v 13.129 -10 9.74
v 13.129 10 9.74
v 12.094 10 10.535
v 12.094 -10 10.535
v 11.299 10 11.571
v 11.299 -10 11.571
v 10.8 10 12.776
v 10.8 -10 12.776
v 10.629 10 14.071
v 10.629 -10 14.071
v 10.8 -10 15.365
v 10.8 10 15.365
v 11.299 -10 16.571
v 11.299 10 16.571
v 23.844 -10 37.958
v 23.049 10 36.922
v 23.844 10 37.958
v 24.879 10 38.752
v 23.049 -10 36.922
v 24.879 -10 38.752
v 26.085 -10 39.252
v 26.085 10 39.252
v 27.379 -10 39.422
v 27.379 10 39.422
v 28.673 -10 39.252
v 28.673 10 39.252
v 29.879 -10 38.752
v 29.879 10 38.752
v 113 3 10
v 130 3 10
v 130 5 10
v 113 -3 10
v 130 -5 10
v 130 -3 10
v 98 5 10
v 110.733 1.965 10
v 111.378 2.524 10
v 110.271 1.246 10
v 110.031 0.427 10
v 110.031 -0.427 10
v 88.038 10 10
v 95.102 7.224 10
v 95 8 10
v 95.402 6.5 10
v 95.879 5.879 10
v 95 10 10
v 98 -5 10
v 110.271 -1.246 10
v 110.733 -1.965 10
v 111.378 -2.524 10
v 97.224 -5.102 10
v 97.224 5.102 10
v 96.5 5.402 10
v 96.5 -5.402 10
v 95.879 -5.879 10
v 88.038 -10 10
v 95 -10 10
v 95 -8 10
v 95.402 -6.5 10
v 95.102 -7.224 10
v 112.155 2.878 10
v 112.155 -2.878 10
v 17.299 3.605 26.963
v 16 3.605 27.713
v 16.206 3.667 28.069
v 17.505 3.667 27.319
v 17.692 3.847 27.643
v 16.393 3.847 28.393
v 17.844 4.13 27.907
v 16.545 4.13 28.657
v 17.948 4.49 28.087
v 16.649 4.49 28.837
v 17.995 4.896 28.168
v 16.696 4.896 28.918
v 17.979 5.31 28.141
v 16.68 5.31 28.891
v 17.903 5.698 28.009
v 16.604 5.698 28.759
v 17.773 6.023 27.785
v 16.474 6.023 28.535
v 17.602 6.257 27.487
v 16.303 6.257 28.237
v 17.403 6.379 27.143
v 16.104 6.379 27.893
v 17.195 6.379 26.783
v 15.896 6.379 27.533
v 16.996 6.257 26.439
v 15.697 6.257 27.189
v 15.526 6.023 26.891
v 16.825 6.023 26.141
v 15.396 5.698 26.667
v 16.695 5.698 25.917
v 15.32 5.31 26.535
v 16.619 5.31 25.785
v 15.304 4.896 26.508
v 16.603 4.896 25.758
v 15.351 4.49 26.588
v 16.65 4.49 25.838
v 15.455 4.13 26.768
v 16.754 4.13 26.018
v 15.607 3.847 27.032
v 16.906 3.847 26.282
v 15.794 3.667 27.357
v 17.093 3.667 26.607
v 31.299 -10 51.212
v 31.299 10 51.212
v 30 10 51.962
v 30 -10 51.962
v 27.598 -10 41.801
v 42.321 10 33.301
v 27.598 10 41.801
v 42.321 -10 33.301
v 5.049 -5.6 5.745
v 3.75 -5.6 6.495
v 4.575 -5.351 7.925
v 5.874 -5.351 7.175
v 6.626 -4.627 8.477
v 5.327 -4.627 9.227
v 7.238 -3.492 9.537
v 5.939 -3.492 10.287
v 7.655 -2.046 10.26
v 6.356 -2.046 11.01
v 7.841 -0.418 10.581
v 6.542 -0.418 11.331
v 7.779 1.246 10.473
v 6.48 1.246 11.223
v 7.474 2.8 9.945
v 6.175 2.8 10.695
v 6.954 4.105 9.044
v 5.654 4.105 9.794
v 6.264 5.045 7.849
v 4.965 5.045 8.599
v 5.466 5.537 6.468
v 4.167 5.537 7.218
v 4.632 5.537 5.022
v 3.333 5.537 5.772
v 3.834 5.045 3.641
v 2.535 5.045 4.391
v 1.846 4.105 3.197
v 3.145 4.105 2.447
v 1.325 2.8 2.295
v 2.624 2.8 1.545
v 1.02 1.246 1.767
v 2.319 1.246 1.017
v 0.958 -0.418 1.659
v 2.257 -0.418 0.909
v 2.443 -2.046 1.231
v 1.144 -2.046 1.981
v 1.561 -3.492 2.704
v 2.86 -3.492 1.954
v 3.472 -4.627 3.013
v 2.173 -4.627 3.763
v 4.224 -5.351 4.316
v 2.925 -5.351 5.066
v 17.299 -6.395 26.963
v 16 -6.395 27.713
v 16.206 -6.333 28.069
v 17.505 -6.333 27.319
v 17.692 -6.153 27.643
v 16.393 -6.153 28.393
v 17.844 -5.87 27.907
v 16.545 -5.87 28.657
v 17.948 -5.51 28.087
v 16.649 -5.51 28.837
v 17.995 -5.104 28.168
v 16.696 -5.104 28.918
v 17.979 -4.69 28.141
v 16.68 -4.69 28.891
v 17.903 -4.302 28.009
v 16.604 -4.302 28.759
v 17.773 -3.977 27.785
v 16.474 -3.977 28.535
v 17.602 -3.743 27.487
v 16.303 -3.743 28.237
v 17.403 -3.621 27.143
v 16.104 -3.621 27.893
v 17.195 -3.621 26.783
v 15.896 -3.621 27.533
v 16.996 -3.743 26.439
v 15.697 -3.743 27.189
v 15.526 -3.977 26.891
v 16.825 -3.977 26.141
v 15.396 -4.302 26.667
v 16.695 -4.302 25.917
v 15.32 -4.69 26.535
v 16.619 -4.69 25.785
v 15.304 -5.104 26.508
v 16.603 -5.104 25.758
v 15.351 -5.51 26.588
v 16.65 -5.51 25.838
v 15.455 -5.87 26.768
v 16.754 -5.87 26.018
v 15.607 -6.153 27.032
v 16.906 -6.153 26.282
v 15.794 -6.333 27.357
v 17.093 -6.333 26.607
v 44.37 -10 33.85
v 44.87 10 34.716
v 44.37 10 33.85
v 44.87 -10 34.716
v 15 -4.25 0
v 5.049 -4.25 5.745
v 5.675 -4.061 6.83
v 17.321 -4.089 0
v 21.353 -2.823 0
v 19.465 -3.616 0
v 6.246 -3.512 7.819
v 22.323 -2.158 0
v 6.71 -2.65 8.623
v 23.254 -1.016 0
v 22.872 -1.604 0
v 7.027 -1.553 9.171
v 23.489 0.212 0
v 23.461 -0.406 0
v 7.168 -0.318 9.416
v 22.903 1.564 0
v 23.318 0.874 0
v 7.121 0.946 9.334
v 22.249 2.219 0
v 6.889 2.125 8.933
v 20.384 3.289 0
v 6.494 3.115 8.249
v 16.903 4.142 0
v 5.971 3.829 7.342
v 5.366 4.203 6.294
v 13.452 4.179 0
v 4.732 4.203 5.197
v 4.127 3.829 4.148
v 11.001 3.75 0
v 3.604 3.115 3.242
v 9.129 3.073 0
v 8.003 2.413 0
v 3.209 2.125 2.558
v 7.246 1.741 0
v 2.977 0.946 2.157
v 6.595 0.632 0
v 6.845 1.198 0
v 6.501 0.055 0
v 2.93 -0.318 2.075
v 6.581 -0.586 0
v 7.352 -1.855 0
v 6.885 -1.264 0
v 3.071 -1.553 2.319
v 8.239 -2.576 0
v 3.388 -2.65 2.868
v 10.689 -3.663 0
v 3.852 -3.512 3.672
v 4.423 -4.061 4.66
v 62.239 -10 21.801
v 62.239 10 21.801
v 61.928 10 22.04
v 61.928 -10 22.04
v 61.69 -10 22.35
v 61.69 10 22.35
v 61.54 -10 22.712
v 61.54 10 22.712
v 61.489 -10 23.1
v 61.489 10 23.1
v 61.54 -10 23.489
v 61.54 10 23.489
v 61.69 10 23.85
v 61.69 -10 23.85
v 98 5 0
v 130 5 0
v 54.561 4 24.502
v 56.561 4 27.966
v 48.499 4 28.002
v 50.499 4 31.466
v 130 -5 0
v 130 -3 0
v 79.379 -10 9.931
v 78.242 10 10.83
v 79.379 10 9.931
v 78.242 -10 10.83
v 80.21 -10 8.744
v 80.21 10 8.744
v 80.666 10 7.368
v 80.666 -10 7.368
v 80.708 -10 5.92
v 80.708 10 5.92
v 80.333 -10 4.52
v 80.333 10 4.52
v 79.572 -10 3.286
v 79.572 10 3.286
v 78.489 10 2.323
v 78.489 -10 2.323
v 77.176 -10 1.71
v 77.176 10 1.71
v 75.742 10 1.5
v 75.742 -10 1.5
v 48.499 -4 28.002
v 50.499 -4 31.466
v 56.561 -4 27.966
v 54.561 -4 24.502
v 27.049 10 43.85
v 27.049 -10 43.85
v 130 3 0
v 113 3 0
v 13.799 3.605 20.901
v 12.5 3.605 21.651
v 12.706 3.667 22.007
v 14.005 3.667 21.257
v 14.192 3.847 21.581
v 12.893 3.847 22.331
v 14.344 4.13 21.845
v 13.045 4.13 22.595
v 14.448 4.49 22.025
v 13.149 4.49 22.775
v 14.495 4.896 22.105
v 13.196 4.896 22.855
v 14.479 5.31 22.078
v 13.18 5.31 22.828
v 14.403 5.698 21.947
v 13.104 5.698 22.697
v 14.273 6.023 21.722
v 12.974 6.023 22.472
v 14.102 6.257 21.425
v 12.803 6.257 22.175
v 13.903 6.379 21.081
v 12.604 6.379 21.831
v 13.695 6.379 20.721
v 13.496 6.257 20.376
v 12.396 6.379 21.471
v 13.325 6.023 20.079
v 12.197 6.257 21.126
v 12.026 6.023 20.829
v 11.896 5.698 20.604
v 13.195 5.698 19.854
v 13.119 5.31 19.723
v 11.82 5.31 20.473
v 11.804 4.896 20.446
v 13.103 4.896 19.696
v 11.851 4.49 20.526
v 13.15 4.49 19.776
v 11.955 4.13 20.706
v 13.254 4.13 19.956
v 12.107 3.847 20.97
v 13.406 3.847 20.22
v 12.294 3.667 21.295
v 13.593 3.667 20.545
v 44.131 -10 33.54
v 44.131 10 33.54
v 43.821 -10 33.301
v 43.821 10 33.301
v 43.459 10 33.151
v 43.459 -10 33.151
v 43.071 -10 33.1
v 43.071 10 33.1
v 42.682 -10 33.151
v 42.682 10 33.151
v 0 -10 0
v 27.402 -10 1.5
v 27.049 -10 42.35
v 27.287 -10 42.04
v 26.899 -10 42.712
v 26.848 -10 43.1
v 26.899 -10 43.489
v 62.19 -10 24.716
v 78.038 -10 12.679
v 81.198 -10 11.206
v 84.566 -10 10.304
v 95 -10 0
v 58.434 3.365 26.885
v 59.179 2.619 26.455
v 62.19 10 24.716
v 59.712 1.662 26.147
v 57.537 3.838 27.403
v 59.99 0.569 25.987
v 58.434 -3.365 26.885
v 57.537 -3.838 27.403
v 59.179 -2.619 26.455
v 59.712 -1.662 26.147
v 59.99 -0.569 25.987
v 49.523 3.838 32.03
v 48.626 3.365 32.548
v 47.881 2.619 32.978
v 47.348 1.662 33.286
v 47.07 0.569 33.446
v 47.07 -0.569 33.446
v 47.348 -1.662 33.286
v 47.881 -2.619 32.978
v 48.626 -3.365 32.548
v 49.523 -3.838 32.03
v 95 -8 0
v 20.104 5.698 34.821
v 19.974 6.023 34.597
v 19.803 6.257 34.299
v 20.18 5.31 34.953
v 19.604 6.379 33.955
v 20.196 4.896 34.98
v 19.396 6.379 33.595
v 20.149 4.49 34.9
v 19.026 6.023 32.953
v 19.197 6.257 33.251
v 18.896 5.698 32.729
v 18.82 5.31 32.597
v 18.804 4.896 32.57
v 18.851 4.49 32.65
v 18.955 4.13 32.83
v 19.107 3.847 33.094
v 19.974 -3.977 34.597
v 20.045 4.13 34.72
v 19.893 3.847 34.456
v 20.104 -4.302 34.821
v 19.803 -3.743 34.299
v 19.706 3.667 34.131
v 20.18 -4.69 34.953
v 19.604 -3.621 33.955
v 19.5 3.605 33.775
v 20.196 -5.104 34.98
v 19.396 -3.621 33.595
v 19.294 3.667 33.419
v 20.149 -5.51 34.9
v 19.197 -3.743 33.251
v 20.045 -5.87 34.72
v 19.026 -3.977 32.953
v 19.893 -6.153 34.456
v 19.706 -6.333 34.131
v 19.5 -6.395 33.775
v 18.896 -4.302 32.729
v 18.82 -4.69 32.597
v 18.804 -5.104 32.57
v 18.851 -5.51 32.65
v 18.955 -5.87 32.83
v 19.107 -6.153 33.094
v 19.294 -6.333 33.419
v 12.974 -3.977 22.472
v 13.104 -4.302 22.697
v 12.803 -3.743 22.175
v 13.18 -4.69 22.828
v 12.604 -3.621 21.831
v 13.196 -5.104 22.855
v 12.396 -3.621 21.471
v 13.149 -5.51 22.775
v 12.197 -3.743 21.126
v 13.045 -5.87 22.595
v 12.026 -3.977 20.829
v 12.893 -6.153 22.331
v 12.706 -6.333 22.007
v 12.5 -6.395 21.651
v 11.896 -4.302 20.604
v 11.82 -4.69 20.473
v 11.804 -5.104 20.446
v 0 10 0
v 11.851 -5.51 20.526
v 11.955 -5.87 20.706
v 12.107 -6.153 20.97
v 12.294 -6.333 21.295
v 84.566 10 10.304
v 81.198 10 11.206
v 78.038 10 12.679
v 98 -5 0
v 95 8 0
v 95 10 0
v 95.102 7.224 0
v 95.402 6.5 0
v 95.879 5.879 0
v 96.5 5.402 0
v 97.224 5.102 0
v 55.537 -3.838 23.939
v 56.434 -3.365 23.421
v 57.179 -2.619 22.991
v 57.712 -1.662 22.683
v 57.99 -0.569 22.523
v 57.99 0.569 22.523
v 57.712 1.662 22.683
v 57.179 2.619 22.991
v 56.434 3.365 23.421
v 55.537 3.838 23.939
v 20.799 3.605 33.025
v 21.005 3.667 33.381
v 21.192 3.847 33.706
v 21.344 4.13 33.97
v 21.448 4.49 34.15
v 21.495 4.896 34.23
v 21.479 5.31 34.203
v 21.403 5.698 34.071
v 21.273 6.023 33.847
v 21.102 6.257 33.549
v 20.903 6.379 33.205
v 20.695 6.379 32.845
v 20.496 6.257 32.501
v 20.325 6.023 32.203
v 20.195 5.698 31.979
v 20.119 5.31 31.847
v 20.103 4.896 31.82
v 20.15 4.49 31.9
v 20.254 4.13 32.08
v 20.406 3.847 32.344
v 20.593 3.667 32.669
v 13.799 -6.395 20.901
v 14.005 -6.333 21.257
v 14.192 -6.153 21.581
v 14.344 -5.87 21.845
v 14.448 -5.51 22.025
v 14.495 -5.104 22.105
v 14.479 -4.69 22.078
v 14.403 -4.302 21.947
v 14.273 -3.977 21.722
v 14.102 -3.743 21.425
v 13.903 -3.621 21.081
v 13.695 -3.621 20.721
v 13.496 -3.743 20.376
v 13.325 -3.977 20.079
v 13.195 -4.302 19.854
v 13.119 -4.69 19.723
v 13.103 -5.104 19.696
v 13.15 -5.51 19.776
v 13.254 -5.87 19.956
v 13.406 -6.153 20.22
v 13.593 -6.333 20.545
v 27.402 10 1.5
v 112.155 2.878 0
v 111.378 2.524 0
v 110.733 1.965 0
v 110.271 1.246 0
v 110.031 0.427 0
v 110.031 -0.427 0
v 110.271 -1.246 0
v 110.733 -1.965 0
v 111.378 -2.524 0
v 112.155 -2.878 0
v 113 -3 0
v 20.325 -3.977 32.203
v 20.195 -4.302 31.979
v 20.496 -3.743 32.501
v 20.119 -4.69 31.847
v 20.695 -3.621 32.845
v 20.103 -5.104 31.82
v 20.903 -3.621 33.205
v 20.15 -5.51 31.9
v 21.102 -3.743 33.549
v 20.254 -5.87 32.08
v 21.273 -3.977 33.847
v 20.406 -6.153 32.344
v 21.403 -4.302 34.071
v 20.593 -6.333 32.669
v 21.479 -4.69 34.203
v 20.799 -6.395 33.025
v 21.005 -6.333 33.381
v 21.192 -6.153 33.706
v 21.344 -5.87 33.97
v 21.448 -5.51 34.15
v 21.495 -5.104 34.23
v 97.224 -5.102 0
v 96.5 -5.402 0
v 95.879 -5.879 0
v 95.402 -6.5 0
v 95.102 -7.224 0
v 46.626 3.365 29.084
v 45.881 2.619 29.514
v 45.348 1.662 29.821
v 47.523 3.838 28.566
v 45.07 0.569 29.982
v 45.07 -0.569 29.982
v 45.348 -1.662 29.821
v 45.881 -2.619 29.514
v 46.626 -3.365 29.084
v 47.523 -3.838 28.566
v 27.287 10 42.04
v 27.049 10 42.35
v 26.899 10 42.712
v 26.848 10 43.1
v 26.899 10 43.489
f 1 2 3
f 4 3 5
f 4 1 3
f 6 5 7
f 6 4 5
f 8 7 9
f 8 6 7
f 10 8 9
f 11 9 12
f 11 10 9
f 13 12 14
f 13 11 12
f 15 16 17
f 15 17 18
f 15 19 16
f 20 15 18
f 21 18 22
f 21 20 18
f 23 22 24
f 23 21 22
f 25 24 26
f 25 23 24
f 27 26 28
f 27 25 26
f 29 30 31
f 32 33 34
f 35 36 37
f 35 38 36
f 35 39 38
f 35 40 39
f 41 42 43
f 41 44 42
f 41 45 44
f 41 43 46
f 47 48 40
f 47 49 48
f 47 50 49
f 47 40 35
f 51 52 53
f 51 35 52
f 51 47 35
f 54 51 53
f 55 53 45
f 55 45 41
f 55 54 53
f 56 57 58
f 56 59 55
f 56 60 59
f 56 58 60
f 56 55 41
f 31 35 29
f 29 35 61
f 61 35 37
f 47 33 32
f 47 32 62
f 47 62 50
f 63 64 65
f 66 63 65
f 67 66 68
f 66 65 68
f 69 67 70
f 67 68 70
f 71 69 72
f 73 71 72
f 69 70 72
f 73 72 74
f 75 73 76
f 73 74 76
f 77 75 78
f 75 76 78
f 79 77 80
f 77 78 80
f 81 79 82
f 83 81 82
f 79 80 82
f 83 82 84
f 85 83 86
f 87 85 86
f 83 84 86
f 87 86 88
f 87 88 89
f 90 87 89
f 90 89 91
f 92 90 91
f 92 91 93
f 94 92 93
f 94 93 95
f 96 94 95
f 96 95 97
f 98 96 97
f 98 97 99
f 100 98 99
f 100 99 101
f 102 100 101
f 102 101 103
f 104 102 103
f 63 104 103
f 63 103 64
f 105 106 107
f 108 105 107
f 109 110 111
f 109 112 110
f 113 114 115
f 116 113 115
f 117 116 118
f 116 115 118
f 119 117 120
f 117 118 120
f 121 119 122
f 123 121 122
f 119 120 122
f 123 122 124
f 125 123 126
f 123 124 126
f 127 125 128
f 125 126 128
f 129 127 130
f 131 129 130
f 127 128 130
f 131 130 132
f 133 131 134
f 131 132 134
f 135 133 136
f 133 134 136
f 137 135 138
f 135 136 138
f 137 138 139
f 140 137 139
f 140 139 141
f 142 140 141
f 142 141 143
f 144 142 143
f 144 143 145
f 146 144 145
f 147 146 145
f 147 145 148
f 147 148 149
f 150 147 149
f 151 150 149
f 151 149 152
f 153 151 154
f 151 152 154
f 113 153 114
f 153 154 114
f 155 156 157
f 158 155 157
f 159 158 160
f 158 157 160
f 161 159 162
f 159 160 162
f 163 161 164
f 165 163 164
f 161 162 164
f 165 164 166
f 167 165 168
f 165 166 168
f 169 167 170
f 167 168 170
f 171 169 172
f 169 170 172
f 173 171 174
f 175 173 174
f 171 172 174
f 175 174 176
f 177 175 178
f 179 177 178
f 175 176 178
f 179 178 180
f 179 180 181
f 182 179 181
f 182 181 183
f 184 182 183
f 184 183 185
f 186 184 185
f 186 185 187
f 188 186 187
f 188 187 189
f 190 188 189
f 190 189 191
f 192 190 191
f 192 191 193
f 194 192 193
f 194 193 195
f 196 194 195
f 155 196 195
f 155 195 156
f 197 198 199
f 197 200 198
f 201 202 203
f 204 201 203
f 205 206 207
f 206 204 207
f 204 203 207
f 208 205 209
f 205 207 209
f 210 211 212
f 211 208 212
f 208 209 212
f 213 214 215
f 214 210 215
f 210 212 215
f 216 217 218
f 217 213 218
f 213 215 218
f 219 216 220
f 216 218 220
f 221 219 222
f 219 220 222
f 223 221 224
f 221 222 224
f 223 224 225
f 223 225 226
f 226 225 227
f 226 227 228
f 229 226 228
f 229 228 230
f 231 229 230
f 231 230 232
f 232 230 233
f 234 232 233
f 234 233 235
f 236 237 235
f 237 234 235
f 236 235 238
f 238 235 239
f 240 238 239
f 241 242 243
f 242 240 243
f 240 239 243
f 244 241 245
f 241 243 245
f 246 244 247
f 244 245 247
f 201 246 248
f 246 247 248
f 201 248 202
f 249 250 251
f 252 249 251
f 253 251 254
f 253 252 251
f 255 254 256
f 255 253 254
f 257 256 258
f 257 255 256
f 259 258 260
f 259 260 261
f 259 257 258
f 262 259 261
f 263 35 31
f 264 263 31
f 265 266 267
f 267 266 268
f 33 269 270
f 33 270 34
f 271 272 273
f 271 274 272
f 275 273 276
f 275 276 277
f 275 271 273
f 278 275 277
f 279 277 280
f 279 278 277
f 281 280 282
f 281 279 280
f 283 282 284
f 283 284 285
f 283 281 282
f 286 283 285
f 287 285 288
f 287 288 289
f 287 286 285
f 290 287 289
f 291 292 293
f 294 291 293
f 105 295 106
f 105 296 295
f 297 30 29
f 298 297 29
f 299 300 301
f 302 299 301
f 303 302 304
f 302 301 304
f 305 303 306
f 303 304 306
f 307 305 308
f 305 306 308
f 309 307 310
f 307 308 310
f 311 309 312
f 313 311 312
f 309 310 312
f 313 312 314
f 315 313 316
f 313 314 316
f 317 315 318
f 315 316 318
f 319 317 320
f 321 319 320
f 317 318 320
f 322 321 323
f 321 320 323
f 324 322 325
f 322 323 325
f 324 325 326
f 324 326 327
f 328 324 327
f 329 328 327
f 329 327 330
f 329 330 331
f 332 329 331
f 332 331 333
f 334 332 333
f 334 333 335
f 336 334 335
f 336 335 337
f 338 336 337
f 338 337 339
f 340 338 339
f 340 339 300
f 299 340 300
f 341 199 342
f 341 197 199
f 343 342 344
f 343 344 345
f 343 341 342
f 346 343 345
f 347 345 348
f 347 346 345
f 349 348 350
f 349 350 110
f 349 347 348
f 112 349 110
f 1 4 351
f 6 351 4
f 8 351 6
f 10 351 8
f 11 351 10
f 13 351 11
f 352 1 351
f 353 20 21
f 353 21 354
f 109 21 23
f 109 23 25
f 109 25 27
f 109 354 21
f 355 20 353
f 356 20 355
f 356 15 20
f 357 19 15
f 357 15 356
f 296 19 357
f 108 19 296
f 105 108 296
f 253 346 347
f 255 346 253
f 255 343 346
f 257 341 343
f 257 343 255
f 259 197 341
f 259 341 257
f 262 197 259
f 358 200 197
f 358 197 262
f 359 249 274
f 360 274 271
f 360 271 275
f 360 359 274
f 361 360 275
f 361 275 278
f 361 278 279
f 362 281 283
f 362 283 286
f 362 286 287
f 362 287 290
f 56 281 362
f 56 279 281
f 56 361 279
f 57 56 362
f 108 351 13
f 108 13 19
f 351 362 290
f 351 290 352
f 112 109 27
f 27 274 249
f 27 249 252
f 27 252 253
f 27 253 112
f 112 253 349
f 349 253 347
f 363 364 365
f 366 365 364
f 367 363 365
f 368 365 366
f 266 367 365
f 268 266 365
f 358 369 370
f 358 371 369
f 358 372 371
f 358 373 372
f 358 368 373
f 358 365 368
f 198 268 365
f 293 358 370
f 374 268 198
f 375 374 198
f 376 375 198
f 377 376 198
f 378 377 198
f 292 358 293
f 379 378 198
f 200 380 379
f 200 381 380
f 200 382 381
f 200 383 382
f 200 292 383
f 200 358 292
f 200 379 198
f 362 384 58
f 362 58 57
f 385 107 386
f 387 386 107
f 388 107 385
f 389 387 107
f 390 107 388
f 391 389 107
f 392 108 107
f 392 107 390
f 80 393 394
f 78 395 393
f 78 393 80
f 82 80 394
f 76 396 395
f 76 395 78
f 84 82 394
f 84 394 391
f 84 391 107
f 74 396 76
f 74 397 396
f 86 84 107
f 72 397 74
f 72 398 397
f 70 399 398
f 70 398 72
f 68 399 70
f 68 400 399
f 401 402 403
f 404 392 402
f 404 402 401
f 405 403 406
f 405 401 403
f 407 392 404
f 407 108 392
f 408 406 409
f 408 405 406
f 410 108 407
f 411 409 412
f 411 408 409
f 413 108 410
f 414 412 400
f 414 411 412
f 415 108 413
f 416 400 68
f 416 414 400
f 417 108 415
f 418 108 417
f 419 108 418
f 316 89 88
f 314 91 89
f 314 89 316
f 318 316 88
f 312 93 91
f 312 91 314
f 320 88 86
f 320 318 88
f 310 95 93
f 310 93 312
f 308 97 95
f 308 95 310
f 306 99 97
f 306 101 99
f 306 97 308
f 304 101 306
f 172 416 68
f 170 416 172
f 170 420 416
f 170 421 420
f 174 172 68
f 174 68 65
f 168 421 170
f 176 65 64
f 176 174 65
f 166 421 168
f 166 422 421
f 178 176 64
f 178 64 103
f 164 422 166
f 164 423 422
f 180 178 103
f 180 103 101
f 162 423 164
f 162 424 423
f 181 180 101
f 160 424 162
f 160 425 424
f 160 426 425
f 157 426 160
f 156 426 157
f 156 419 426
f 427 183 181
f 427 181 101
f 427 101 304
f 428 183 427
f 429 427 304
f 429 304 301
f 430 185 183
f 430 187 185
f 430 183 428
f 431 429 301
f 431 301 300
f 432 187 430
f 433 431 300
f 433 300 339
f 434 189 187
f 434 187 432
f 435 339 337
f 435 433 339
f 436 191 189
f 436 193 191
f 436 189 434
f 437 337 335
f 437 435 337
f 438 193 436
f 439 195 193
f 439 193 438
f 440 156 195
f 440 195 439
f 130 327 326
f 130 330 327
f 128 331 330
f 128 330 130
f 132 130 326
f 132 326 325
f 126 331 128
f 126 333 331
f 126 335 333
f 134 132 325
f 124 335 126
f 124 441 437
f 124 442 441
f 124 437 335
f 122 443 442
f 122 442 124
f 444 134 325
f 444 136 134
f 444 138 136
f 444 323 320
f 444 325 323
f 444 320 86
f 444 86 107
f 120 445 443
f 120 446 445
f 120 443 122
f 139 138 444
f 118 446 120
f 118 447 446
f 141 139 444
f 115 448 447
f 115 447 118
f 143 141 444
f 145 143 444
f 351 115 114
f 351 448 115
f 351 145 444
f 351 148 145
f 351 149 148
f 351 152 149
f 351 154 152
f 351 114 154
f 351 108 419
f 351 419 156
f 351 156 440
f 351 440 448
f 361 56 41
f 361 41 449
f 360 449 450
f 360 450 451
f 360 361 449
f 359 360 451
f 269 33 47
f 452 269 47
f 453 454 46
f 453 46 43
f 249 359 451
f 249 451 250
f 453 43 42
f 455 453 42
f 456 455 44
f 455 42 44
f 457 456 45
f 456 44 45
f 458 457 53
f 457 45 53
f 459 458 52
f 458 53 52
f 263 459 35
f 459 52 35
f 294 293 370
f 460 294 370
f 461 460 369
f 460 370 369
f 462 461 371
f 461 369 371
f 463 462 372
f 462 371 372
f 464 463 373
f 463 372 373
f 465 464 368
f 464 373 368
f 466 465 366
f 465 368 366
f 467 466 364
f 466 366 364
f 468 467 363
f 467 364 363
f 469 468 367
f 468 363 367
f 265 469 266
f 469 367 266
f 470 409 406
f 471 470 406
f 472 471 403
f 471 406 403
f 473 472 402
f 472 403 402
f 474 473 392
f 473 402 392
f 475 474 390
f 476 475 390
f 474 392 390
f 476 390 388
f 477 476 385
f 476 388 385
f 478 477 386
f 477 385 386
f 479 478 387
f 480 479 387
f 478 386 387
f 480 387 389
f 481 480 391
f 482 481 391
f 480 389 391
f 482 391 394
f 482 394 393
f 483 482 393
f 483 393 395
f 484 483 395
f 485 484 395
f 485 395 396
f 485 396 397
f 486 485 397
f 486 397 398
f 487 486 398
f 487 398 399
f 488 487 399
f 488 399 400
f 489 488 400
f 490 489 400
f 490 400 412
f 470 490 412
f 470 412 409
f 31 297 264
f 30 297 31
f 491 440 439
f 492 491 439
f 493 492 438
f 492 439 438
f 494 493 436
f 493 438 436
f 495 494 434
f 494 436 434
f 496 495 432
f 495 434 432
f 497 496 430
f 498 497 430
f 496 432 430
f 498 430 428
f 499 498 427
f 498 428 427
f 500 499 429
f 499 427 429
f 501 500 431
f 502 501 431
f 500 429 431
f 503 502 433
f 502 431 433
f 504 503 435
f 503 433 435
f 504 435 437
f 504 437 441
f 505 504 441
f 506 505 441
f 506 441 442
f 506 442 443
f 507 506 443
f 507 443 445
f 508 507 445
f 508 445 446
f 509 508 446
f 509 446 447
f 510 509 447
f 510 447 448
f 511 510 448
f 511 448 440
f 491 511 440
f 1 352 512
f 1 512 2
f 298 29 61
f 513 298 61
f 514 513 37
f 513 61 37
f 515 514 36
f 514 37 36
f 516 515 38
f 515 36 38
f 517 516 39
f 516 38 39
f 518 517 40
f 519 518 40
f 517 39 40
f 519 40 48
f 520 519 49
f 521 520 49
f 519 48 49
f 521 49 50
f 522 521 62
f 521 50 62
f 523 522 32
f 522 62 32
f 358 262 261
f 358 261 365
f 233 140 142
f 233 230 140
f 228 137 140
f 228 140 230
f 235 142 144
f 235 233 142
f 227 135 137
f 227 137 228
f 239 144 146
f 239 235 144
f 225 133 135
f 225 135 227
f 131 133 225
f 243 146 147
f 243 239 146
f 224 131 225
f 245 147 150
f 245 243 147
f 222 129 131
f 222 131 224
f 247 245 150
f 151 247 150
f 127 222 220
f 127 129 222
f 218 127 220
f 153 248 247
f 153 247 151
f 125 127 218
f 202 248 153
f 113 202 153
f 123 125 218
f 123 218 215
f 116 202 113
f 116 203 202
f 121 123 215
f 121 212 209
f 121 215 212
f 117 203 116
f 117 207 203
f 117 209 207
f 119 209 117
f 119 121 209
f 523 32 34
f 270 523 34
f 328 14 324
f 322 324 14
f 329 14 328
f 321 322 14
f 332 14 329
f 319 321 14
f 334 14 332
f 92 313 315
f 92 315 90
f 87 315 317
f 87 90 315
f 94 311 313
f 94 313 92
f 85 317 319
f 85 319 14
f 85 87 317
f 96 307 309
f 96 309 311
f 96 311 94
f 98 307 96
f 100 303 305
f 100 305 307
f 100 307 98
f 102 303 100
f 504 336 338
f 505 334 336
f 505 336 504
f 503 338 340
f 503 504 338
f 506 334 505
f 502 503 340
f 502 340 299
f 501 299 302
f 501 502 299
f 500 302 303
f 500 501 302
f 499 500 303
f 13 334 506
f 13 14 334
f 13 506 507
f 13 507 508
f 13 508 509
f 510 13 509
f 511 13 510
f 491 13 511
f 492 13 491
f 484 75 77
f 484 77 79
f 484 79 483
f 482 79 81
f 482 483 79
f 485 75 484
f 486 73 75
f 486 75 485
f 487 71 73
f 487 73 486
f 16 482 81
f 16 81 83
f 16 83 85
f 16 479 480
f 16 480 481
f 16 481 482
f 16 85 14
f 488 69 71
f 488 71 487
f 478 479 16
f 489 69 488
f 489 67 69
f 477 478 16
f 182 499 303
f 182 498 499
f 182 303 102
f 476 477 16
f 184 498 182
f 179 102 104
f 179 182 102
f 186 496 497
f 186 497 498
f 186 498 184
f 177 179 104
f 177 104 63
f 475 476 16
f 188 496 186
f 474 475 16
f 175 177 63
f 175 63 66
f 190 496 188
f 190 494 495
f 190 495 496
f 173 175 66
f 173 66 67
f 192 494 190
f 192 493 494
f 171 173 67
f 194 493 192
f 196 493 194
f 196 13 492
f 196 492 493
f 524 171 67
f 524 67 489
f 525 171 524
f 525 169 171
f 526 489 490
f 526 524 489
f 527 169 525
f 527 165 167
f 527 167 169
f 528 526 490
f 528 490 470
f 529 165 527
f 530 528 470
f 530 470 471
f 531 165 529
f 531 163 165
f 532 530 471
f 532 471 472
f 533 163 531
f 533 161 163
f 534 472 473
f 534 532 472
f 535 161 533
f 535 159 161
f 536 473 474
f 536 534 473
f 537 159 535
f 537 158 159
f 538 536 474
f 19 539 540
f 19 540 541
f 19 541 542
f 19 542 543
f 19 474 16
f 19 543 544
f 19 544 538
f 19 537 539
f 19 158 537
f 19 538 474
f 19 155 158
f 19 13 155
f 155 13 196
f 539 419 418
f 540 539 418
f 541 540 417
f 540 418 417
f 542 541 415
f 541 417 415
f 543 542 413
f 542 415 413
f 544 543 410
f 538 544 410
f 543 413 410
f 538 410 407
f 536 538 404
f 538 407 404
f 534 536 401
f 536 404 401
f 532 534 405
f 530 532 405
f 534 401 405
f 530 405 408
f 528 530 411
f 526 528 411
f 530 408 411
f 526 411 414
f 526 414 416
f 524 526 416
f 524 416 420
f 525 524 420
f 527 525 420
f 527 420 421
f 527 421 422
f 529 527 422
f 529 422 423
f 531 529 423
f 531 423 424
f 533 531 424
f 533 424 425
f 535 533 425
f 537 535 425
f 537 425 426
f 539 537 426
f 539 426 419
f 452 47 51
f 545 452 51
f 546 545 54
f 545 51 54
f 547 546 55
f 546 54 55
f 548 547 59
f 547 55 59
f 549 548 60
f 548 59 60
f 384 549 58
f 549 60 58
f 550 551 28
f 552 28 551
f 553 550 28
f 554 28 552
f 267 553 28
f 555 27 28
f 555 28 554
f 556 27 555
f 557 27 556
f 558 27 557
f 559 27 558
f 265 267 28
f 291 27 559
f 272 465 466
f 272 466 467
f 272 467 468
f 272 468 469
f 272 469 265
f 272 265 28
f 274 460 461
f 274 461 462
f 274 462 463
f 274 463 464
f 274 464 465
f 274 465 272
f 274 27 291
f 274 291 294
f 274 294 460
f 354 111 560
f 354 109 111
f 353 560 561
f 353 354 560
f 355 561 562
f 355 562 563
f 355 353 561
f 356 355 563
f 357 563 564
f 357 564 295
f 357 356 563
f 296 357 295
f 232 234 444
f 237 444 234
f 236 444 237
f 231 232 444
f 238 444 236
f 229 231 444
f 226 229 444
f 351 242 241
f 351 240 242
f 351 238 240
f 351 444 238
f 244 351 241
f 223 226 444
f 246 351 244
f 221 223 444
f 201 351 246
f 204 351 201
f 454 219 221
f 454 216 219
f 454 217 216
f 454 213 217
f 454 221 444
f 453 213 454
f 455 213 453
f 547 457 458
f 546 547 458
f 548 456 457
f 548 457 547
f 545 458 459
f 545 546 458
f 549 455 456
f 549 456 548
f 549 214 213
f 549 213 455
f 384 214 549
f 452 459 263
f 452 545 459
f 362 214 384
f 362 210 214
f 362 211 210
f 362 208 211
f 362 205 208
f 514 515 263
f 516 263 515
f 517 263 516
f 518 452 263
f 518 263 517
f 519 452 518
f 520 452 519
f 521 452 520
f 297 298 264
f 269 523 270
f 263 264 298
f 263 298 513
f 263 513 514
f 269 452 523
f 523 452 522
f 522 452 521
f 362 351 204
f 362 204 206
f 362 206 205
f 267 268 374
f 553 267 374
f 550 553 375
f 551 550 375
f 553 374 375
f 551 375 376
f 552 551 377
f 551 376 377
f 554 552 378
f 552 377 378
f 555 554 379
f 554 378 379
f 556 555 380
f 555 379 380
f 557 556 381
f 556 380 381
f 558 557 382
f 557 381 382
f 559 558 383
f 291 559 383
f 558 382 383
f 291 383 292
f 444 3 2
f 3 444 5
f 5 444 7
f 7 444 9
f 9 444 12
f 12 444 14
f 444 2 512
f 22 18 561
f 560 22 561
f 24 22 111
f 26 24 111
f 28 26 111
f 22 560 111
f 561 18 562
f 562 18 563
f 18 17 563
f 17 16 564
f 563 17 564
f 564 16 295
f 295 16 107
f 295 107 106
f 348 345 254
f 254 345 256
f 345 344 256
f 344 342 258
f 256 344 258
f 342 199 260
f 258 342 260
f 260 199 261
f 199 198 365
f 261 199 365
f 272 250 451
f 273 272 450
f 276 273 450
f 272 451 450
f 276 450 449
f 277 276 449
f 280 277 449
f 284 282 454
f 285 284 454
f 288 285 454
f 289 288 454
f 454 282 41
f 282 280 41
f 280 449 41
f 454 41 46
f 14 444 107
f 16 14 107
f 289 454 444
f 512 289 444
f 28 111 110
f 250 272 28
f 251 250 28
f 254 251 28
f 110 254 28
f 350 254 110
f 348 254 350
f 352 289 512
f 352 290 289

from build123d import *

# Parameters (mm, degrees)
F1_DEPTH  = 10
F3_DEPTH  = 10.001
F5_DEPTH  = 25
F6_R      = 1.395
F7_DEPTH  = 25
F8_R      = 4.25
F9_DEPTH  = 112.584302492
F8_R_2    = 5.6
F10_DEPTH = 1.5


with BuildPart() as f1:
    # F0 (on Front) → F1 (new body, symmetric)
    with BuildSketch(Plane.XZ):
        with BuildLine():
            Line((30, 51.9615242271), (0, 0))
            Line((0, 0), (130, 0))
            Line((130, 0), (130, 10))
            Line((130, 10), (88.0384757729, 10))
            ThreePointArc((88.0384757729, 10), (82.8620948709, 10.6814834742), (78.0384757729, 12.6794919243))
            Line((78.0384757729, 12.6794919243), (62.2390923627, 21.8012701892))
            ThreePointArc((62.2390923627, 21.8012701892), (61.5402036233, 22.7120797272), (61.6900542571, 23.8503082949))
            Line((61.6900542571, 23.8503082949), (62.1900542571, 24.7163336987))
            Line((62.1900542571, 24.7163336987), (44.8695461814, 34.7163336987))
            Line((44.8695461814, 34.7163336987), (44.3695461814, 33.8503082949))
            ThreePointArc((44.3695461814, 33.8503082949), (43.4587366433, 33.1514195555), (42.3205080757, 33.3012701892))
            Line((42.3205080757, 33.3012701892), (27.5980762114, 41.8012701892))
            ThreePointArc((27.5980762114, 41.8012701892), (26.8991874719, 42.7120797272), (27.0490381057, 43.8503082949))
            Line((27.0490381057, 43.8503082949), (31.2990381057, 51.2115242271))
            Line((31.2990381057, 51.2115242271), (30, 51.9615242271))
        make_face()
        with BuildLine():
            Line((27.4019237886, 1.5), (13.1291651246, 9.7403810568))
            ThreePointArc((13.1291651246, 9.7403810568), (10.7995359932, 12.7764128502), (11.2990381057, 16.5705080757))
            Line((11.2990381057, 16.5705080757), (23.0490381057, 36.9221050646))
            ThreePointArc((23.0490381057, 36.9221050646), (26.0850698991, 39.2517341961), (29.8791651246, 38.7522320835))
            Line((29.8791651246, 38.7522320835), (78.2416697508, 10.8301270189))
            ThreePointArc((78.2416697508, 10.8301270189), (80.5712988822, 5.2059047745), (75.7416697508, 1.5))
            Line((75.7416697508, 1.5), (27.4019237886, 1.5))
        make_face(mode=Mode.SUBTRACT)
    extrude(amount=F1_DEPTH, both=True)

    # F2 (on face) → F3 (cut, through all)
    with BuildSketch(Plane.XY.offset(10)):
        with BuildLine():
            Line((130, 3), (113, 3))
            ThreePointArc((113, 3), (110, 0), (113, -3))
            Line((113, -3), (130, -3))
            Line((130, -3), (130, 3))
        make_face()
        with BuildLine():
            Line((98, 5), (130, 5))
            Line((130, 5), (130, 10))
            Line((130, 10), (95, 10))
            Line((95, 10), (95, 8))
            ThreePointArc((95, 8), (95.8786796564, 5.8786796564), (98, 5))
        make_face()
        with BuildLine():
            Line((95, -10), (130, -10))
            Line((130, -10), (130, -5))
            Line((130, -5), (98, -5))
            ThreePointArc((98, -5), (95.8786796564, -5.8786796564), (95, -8))
            Line((95, -8), (95, -10))
        make_face()
    extrude(amount=-F3_DEPTH, mode=Mode.SUBTRACT)

    # F4 (on face) → F5 (cut)
    with BuildSketch(Plane(origin=(30, 0, 51.9615242271), x_dir=(0.8660254038, 0, -0.5), z_dir=(0.5, 0, 0.8660254038))):
        with BuildLine():
            ThreePointArc((28, 4), (24, 0), (28, -4))
            Line((28, -4), (35, -4))
            ThreePointArc((35, -4), (39, 0), (35, 4))
            Line((35, 4), (28, 4))
        make_face()
    extrude(amount=-F5_DEPTH, mode=Mode.SUBTRACT)

    # F6 (on face) → F7 (cut)
    with BuildSketch(Plane(origin=(0, 0, 0), x_dir=(0, -1, 0), z_dir=(-0.8660254038, 0, 0.5))):
        with Locations((-5, 25)):
            Circle(F6_R)
        with Locations((-5, 32)):
            Circle(F6_R)
        with Locations((-5, 39)):
            Circle(F6_R)
        with Locations((5, 25)):
            Circle(F6_R)
        with Locations((5, 32)):
            Circle(F6_R)
        with Locations((5, 39)):
            Circle(F6_R)
    extrude(amount=-F7_DEPTH, mode=Mode.SUBTRACT)

    # F8 (on face) → F9 (cut, through all)
    with BuildSketch(Plane(origin=(0, 0, 0), x_dir=(0, -1, 0), z_dir=(-0.8660254038, 0, 0.5))):
        with Locations((0, 7.5)):
            Circle(F8_R)
    extrude(amount=-F9_DEPTH, mode=Mode.SUBTRACT)

    # F8 (on face) → F10 (cut)
    with BuildSketch(Plane(origin=(0, 0, 0), x_dir=(0, -1, 0), z_dir=(-0.8660254038, 0, 0.5))):
        with Locations((0, 7.5)):
            Circle(F8_R_2)
        with Locations((0, 7.5)):
            Circle(F8_R, mode=Mode.SUBTRACT)
    extrude(amount=-F10_DEPTH, mode=Mode.SUBTRACT)


solid = f1.part
